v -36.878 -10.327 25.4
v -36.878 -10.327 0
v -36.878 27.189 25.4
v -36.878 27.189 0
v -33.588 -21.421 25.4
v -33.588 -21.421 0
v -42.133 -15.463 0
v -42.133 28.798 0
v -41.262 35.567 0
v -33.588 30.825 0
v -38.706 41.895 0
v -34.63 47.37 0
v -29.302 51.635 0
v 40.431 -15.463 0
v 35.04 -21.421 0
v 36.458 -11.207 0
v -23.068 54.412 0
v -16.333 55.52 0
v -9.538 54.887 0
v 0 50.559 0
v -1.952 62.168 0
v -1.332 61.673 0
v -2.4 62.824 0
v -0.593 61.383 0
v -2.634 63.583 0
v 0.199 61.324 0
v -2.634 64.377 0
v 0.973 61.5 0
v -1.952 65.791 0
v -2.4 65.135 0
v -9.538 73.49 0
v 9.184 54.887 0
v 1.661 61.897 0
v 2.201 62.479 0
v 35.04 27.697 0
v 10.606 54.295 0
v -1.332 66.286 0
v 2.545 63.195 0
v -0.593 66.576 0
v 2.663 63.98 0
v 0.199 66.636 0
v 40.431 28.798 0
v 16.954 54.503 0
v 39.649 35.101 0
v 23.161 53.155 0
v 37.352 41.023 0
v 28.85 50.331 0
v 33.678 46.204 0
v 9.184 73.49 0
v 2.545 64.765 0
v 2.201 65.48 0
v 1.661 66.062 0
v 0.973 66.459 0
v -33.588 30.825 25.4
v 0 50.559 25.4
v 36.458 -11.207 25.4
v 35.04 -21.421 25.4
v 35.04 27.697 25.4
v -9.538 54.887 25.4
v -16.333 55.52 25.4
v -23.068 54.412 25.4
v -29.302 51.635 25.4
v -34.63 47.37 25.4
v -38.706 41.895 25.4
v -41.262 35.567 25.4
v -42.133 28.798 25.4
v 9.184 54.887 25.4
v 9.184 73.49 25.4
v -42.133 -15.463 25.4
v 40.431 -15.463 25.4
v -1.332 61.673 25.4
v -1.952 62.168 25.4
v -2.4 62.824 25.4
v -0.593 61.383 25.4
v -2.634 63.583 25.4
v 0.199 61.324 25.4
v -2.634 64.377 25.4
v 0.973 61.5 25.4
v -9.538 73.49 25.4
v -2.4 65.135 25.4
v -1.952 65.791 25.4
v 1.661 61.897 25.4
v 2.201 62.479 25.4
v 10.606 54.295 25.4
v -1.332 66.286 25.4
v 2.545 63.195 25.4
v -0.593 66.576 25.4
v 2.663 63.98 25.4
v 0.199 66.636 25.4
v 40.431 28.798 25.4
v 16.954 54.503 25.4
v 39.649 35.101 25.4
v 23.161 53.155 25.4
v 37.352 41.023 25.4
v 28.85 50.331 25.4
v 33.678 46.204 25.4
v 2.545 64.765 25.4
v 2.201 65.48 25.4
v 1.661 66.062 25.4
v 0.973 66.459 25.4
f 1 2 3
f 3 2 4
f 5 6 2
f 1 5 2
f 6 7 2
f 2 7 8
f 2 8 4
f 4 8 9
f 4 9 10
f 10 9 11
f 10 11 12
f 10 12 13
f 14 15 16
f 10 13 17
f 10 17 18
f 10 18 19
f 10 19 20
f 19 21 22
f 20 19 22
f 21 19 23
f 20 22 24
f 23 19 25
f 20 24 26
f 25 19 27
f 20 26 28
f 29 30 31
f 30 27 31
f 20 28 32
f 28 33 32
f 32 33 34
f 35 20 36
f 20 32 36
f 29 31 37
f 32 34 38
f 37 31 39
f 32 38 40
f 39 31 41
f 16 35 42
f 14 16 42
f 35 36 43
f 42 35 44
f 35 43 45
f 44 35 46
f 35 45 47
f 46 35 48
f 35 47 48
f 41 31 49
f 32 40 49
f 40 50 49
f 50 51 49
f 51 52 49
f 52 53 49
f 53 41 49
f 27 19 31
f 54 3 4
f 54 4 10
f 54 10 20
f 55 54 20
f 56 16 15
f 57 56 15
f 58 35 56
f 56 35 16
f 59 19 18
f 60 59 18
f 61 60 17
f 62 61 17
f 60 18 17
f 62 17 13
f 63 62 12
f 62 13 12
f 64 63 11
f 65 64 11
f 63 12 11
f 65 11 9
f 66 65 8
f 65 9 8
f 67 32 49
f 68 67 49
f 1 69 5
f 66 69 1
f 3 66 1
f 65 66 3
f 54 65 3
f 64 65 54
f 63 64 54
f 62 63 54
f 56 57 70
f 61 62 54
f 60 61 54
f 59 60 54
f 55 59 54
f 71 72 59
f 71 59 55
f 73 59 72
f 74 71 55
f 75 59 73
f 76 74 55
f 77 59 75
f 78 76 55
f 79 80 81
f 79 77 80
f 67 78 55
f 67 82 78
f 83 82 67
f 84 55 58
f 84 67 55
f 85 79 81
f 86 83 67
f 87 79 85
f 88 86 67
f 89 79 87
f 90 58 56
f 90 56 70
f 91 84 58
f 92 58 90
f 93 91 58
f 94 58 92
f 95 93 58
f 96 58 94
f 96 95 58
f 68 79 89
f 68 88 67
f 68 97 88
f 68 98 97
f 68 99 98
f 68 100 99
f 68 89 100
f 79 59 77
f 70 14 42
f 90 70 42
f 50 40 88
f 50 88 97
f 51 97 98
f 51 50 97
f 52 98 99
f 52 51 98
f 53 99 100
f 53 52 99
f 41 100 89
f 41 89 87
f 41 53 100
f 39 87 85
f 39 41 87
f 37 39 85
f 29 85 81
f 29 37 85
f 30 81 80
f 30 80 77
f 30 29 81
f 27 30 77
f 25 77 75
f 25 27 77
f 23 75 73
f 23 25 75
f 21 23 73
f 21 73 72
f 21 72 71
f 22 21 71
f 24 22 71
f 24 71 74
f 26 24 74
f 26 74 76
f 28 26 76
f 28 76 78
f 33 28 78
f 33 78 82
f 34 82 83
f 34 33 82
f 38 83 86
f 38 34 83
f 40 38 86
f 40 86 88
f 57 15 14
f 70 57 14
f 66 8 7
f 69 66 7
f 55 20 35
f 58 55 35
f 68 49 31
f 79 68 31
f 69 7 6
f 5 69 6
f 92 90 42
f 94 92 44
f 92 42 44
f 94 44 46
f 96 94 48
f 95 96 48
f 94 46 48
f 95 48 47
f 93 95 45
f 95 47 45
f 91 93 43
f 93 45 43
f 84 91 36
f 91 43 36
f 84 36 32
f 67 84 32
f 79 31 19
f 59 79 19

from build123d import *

# Parameters (mm, degrees)
F0_R     = 2.663463
F1_DEPTH = 25.4
F2_DEPTH = 25.4


with BuildPart() as f1:
    # F0 (on Top) → F1 (new body)
    with BuildSketch(Plane.XY):
        with BuildLine():
            ThreePointArc((-9.537551, 54.887395), (-32.102884, 49.673264), (-42.132925, 28.797926))
            Line((-42.132925, 28.797926), (-42.132925, -15.462926))
            Line((-42.132925, -15.462926), (-33.588473, -21.421118))
            Line((-33.588473, -21.421118), (-36.878168, -10.327116))
            Line((-36.878168, -10.327116), (-36.878168, 27.189448))
            Line((-36.878168, 27.189448), (-33.588473, 30.825427))
            Line((-33.588473, 30.825427), (0, 50.559394))
            Line((0, 50.559394), (35.039842, 27.69687))
            Line((35.039842, 27.69687), (36.458459, -11.207074))
            Line((36.458459, -11.207074), (35.039842, -21.421118))
            Line((35.039842, -21.421118), (40.430587, -15.462926))
            Line((40.430587, -15.462926), (40.430587, 28.797926))
            ThreePointArc((40.430587, 28.797926), (31.391675, 48.416927), (10.605718, 54.294944))
            Line((10.605718, 54.294944), (9.183838, 54.887395))
            Line((9.183838, 54.887395), (9.183838, 73.490292))
            Line((9.183838, 73.490292), (-9.537551, 73.490292))
            Line((-9.537551, 73.490292), (-9.537551, 54.887395))
        make_face()
        with Locations((0, 63.979626)):
            Circle(F0_R, mode=Mode.SUBTRACT)
    extrude(amount=F1_DEPTH)

    # F0 (on Top) → F2 (join)
    with BuildSketch(Plane.XY):
        with BuildLine():
            ThreePointArc((-9.537551, 54.887395), (-32.102884, 49.673264), (-42.132925, 28.797926))
            Line((-42.132925, 28.797926), (-42.132925, -15.462926))
            Line((-42.132925, -15.462926), (-33.588473, -21.421118))
            Line((-33.588473, -21.421118), (-36.878168, -10.327116))
            Line((-36.878168, -10.327116), (-36.878168, 27.189448))
            Line((-36.878168, 27.189448), (-33.588473, 30.825427))
            Line((-33.588473, 30.825427), (0, 50.559394))
            Line((0, 50.559394), (35.039842, 27.69687))
            Line((35.039842, 27.69687), (36.458459, -11.207074))
            Line((36.458459, -11.207074), (35.039842, -21.421118))
            Line((35.039842, -21.421118), (40.430587, -15.462926))
            Line((40.430587, -15.462926), (40.430587, 28.797926))
            ThreePointArc((40.430587, 28.797926), (31.391675, 48.416927), (10.605718, 54.294944))
            Line((10.605718, 54.294944), (9.183838, 54.887395))
            Line((9.183838, 54.887395), (9.183838, 73.490292))
            Line((9.183838, 73.490292), (-9.537551, 73.490292))
            Line((-9.537551, 73.490292), (-9.537551, 54.887395))
        make_face()
        with Locations((0, 63.979626)):
            Circle(F0_R, mode=Mode.SUBTRACT)
    extrude(amount=F2_DEPTH)


solid = f1.part
